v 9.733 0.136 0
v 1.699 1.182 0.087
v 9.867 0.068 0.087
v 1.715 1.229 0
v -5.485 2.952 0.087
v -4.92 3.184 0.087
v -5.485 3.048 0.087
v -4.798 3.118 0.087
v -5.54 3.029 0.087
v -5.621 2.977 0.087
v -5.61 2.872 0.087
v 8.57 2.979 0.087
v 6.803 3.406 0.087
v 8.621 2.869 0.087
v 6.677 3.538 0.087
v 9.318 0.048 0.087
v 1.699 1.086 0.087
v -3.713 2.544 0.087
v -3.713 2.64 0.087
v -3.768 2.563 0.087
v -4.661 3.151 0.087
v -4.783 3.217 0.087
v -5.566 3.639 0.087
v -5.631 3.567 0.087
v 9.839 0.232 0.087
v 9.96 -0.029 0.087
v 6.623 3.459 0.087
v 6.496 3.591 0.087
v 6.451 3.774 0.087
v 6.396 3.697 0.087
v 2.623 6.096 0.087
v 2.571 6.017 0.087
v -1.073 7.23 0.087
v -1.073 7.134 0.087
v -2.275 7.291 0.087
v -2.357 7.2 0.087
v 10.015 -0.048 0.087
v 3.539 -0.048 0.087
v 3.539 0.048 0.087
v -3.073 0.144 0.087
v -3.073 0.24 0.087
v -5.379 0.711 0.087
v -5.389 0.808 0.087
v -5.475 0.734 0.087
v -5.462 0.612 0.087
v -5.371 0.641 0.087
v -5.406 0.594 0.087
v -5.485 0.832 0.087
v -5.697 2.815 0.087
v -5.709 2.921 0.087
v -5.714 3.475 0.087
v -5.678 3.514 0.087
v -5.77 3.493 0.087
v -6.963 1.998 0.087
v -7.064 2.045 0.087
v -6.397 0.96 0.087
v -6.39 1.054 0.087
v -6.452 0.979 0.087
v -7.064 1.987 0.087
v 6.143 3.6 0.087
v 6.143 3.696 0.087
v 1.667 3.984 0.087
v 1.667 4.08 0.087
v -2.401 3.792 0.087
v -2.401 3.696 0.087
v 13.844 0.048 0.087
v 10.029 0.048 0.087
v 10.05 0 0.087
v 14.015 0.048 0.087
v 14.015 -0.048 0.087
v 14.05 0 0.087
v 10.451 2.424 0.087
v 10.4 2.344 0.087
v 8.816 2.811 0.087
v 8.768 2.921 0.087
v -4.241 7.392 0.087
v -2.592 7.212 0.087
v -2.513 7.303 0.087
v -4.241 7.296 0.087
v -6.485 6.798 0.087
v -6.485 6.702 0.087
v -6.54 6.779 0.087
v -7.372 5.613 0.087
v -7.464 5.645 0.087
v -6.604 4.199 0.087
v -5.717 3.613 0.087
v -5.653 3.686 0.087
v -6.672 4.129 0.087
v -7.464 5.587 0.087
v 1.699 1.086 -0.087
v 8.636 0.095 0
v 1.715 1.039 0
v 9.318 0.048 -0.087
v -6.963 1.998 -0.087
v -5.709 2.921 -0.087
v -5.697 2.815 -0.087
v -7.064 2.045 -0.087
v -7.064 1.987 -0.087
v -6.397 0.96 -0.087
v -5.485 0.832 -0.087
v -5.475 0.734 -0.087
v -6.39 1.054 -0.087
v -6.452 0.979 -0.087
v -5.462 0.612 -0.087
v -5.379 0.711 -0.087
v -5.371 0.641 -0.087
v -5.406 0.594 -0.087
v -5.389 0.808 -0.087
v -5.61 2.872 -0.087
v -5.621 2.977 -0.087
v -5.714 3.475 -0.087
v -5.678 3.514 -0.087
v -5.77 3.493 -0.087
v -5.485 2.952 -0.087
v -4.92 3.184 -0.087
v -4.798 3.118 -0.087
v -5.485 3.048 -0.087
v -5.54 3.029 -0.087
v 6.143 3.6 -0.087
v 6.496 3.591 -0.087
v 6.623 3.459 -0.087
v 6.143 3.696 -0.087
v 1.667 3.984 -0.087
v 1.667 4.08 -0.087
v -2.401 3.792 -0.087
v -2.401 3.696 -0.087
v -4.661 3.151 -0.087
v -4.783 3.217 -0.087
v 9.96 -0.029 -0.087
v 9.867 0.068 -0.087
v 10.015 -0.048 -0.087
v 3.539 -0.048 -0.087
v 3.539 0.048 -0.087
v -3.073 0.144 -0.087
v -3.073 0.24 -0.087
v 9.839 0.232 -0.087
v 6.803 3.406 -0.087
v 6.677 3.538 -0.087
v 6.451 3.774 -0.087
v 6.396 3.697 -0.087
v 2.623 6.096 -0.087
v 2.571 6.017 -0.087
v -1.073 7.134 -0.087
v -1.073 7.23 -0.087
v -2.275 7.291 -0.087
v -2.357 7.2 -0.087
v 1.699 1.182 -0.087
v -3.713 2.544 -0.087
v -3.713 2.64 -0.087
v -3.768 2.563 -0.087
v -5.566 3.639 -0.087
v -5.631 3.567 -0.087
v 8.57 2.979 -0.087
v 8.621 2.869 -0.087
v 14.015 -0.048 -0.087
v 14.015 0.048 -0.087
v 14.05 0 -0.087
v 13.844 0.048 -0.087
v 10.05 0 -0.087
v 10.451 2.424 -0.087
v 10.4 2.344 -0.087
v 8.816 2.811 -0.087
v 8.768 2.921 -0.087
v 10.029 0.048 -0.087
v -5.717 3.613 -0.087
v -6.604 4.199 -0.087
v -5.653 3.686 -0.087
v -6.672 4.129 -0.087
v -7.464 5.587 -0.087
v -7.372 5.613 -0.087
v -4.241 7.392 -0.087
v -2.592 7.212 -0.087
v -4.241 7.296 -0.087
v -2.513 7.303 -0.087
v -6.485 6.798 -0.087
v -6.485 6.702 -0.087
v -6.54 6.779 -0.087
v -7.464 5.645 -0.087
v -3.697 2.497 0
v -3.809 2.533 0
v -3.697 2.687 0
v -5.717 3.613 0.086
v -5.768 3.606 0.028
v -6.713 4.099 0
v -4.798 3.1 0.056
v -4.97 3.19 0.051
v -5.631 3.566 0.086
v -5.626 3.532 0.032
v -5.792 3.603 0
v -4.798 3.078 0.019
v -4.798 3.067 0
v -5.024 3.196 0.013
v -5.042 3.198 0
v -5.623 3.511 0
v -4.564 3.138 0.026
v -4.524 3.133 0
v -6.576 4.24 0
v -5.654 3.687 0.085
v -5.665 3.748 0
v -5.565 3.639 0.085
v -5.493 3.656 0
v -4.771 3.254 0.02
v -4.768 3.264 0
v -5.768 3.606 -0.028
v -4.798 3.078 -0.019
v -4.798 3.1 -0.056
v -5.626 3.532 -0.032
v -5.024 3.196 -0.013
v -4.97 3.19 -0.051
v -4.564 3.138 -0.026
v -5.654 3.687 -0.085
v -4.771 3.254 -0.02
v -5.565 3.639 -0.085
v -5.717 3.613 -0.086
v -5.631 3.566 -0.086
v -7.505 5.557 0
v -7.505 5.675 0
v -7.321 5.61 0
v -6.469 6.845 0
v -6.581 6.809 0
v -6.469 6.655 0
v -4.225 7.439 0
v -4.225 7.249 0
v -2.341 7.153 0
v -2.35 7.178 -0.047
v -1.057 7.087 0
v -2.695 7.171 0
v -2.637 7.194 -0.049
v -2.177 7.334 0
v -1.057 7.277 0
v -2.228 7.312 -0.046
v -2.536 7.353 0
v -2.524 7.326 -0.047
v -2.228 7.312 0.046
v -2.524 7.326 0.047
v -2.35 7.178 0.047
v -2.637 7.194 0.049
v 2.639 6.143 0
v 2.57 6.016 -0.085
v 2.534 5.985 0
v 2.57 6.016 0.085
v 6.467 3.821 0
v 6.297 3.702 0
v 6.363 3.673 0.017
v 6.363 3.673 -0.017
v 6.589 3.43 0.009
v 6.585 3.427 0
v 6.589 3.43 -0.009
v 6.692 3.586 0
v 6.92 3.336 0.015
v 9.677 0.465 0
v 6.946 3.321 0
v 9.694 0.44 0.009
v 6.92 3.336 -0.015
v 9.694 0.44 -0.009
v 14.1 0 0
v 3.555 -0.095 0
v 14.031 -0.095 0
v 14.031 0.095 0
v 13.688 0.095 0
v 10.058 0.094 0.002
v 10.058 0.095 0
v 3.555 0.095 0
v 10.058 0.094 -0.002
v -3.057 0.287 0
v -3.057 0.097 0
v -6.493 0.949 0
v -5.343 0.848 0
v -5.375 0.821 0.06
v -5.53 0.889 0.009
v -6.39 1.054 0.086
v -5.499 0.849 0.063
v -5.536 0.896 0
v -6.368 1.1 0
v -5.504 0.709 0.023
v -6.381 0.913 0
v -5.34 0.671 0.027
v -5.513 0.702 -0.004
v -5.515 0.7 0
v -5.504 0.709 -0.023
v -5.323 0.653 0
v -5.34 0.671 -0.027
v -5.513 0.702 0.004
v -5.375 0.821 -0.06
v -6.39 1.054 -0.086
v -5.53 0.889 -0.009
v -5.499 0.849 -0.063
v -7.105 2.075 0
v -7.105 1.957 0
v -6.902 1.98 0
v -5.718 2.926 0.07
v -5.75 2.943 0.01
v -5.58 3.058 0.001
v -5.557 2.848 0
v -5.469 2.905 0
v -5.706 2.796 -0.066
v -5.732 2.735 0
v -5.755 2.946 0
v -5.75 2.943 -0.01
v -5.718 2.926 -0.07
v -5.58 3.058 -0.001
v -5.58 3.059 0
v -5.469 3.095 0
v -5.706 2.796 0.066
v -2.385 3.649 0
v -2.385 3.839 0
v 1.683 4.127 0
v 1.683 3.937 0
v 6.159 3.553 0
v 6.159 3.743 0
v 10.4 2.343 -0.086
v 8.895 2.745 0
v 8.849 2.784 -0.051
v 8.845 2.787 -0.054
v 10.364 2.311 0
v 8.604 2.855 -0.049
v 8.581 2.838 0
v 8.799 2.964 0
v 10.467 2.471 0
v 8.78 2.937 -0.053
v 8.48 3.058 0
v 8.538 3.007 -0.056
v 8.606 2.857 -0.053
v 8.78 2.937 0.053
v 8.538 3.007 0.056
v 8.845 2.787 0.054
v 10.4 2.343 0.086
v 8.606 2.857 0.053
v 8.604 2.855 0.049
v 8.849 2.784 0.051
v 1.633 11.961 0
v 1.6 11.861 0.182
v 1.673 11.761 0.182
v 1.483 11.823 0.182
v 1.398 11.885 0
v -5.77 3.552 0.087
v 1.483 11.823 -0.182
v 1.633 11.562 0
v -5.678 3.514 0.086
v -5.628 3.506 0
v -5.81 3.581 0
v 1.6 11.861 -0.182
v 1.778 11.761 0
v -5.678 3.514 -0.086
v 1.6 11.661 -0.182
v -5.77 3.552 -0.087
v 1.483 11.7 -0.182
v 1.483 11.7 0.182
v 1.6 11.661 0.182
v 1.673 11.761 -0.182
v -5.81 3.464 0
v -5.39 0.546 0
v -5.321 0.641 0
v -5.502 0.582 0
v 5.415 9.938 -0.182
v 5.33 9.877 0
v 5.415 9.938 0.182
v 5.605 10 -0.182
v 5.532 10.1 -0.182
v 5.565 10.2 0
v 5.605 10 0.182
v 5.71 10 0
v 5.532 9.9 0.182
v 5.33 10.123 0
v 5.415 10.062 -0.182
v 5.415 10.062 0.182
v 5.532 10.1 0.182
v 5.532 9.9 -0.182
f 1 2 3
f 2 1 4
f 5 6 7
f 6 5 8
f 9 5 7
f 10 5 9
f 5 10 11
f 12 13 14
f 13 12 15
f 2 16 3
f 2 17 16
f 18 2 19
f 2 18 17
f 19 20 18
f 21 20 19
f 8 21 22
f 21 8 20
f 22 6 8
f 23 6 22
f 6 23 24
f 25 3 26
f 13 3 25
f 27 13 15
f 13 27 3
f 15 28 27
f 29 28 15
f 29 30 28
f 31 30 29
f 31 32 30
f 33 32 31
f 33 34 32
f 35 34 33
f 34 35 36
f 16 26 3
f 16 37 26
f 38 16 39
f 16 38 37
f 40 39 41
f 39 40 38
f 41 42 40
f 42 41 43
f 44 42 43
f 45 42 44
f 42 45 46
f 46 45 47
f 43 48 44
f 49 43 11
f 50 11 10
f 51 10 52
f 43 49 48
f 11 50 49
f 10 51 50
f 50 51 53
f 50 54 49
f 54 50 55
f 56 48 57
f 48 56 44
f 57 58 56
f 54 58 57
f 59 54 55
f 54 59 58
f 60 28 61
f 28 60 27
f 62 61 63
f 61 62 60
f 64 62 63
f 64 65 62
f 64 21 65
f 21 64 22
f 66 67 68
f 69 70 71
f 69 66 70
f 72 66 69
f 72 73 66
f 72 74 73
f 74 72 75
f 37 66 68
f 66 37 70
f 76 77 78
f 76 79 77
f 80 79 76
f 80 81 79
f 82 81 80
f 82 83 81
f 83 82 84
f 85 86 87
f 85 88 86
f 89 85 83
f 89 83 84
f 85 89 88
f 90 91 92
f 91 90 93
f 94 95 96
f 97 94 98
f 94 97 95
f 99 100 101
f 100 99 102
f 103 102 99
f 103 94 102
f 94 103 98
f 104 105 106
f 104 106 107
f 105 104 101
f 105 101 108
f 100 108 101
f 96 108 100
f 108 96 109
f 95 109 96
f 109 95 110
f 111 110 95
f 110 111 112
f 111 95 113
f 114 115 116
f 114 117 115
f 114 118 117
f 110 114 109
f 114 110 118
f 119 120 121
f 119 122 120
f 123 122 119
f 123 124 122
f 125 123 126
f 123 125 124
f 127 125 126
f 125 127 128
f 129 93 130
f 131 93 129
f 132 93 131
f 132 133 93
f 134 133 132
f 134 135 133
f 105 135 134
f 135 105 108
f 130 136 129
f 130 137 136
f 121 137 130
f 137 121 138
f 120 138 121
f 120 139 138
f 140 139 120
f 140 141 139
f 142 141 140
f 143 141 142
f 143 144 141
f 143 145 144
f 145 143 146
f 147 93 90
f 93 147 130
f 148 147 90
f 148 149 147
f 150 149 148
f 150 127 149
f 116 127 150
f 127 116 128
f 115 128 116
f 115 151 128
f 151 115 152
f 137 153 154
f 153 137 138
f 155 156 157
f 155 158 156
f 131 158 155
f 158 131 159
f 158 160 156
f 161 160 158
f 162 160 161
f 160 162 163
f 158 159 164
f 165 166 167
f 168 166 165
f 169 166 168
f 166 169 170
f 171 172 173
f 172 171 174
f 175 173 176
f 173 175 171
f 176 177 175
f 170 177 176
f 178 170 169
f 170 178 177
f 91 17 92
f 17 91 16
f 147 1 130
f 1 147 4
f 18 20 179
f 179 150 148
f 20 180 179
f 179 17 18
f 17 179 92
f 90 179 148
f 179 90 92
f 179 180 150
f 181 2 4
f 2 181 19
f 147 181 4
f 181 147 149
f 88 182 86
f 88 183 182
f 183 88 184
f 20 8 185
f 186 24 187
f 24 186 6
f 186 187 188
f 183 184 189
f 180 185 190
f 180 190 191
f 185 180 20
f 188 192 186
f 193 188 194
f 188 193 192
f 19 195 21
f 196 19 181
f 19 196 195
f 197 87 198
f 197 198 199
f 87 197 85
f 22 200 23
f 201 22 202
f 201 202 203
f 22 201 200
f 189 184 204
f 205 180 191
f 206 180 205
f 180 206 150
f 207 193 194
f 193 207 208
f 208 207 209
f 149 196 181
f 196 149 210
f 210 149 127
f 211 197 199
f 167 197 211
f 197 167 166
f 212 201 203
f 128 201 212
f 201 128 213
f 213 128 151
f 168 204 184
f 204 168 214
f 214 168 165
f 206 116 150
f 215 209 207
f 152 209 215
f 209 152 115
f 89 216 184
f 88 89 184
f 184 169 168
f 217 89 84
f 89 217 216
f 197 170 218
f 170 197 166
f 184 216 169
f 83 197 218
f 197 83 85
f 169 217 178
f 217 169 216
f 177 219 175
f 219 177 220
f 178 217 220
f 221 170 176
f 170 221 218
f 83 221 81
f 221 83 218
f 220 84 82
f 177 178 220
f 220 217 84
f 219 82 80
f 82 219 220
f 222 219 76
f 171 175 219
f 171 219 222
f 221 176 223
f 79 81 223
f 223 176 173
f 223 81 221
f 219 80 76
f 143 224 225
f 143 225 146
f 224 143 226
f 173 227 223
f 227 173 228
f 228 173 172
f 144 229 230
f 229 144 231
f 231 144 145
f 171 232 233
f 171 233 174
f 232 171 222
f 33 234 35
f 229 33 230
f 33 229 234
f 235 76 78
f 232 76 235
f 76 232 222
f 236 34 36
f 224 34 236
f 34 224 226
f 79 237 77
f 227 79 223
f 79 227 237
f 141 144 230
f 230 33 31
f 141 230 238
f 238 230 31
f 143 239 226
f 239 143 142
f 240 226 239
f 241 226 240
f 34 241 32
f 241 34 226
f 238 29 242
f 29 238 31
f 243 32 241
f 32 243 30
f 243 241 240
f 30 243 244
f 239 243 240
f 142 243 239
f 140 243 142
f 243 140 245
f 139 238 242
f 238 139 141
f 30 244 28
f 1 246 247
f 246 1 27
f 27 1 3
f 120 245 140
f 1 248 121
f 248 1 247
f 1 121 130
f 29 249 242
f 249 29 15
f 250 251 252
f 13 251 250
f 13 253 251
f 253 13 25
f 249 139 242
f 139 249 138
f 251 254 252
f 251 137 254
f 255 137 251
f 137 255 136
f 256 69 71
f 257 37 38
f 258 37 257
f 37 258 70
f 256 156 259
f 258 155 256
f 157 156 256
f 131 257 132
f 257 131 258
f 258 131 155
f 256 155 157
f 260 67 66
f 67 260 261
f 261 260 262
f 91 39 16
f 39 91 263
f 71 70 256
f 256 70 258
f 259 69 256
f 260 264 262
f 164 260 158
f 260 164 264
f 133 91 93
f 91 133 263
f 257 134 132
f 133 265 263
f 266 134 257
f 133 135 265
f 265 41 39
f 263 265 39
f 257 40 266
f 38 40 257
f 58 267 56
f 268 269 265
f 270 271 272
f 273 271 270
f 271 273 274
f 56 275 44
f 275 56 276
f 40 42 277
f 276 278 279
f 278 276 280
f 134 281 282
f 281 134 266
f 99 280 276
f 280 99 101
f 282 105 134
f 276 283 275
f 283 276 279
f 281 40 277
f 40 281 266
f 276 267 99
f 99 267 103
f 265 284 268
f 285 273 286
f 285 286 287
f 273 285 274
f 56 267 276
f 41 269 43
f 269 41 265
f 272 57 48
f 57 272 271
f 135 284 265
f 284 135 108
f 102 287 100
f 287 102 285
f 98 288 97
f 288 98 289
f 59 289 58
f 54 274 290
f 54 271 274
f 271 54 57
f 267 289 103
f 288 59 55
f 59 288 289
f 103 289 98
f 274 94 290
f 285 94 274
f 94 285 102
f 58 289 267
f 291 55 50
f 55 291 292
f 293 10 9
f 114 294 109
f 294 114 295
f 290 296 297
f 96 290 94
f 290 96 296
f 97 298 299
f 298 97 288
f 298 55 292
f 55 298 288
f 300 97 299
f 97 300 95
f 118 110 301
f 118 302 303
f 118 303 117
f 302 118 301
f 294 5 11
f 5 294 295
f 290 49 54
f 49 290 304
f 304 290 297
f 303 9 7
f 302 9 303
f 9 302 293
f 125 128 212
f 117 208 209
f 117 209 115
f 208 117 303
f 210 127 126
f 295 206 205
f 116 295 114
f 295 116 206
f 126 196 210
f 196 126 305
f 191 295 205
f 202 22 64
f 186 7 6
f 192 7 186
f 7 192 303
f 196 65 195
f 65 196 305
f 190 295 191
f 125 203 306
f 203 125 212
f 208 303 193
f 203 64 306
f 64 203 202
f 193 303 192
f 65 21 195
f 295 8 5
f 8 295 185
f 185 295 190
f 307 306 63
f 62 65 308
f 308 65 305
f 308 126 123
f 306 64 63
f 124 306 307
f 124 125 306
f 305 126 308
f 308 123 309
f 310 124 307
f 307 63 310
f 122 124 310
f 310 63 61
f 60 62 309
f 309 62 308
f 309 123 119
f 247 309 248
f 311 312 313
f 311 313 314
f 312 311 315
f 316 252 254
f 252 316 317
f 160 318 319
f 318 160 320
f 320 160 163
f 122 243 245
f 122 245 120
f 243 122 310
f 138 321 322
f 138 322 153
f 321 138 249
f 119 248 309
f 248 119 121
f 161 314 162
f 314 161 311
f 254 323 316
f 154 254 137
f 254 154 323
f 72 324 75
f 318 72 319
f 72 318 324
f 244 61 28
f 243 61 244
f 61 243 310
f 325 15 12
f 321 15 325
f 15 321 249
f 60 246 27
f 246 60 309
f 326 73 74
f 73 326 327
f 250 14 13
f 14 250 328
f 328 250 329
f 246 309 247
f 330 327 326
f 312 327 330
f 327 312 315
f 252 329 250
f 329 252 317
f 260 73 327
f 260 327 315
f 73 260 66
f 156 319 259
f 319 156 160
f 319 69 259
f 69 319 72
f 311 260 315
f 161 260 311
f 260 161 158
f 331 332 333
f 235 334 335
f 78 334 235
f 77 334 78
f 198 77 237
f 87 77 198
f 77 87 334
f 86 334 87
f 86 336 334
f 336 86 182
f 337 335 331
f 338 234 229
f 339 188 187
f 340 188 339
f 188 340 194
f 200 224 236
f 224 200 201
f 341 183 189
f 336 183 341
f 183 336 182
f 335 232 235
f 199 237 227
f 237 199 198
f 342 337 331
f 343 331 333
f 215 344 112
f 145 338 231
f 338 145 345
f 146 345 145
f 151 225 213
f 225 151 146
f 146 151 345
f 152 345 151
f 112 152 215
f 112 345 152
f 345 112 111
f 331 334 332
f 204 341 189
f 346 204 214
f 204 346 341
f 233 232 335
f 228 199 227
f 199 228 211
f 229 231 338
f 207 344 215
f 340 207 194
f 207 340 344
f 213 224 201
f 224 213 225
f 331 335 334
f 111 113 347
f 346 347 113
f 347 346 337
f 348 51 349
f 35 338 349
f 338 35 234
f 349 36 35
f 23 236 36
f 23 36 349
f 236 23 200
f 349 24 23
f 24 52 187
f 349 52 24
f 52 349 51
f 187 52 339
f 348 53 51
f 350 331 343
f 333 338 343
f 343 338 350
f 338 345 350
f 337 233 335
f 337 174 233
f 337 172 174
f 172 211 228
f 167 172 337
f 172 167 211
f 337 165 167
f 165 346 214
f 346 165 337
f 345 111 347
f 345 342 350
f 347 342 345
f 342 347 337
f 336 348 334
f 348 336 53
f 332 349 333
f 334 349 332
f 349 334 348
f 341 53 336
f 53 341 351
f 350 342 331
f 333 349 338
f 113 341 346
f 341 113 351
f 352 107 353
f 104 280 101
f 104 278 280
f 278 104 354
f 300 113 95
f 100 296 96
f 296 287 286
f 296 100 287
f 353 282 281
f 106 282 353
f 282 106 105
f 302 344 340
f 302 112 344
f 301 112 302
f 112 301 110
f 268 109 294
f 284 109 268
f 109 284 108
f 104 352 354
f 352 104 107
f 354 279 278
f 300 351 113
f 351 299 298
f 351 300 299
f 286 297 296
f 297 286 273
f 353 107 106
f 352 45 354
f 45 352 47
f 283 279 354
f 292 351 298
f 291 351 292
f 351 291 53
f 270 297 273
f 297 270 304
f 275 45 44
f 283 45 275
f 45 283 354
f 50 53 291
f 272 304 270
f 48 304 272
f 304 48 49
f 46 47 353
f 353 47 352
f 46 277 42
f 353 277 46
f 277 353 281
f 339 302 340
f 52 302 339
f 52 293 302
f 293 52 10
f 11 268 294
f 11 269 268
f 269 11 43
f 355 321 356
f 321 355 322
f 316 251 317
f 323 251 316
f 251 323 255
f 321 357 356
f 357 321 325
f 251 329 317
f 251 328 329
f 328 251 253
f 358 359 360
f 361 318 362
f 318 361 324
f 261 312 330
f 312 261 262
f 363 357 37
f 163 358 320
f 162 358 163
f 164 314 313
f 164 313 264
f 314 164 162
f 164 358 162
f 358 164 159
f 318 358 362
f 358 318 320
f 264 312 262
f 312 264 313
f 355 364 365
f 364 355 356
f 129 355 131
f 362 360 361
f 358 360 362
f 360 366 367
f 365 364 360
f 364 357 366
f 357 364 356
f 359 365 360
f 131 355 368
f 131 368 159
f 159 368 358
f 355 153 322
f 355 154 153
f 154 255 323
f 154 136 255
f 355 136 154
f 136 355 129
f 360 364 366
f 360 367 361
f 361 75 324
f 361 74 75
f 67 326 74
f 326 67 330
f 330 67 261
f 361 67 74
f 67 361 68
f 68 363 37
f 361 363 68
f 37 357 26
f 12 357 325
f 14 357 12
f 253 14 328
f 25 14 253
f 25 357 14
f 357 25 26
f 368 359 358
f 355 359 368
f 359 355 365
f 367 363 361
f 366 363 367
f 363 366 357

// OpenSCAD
v1=[[10,0,0,0.1], [-23,3,0,0.1],[-1,15,0,0.1],[10,0,0,0.1] ];
 


path1=[for(t=[0:0.1:1])bez2(t, v1)];
 polyline(path1) ;


pt1=[[14,0,0,0.1], [-28,-2,0,0.1],[4,10,0,0.1],[14,0,0,0.1] ];

path2=[for(t=[0:0.1:1])bez2(t, pt1)];
 polyline(path2) ;
 tv=($t+0.5)%1;
th=($t)%1;
x1=lerp(th,pow(th,4),1.05-th);

x2=lerp(tv,pow(tv,4),1.05-tv);
f1= bez2(x2, v1);
 


f2=bez2(x1, v1);
 
//translate (v3(f2))sphere(1);

t1=bez2(x2, pt1);
 
//translate (v3(t1))sphere(1);

t2=bez2(x1, pt1);
 
//translate (v3(t2))sphere(1);
 polyline([[3+f1.x*0.25,10+f1.y*0.5,0,0.21],f1,t1]) ;
 polyline([[3+f2.x*0.25,10+f2.y*0.5,0,0.21],f2,t2]) ;


function bez2(t, v) = 
(len(v) > 2) ? 
bez2(t,
[  for (i = [0: len(v) - 2]) v[i] * (1 - t) + v[i + 1] * (t)]
): 
v[0] * (1 - t) + v[1] * (t);


function v3(v) = [v[0], max(0,v[1]), max(0,v[2])];

function lerp( v1, v2, bias) = (1-bias)*v1 + bias*v2;



 module polyline(p) {for(i=[0:max(0,len(p)-2)])line(p[i],p[wrap(i+1,len(p)  )]);
} // polyline plotter
module line(p1, p2 ,width=0.1) 
{ // single line plotter
    hull() {
        translate(v3(p1)) sphere(p1[3]);
        translate(v3(p2)) sphere(p2[3]);
    }
}
function wrap(x,x_max=1,x_min=0) = (((x - x_min) % (x_max - x_min)) + (x_max - x_min)) % (x_max - x_min) + x_min; // wraps numbers inside boundaries



//function v3(v)=[v.x,v.y,v.z];
